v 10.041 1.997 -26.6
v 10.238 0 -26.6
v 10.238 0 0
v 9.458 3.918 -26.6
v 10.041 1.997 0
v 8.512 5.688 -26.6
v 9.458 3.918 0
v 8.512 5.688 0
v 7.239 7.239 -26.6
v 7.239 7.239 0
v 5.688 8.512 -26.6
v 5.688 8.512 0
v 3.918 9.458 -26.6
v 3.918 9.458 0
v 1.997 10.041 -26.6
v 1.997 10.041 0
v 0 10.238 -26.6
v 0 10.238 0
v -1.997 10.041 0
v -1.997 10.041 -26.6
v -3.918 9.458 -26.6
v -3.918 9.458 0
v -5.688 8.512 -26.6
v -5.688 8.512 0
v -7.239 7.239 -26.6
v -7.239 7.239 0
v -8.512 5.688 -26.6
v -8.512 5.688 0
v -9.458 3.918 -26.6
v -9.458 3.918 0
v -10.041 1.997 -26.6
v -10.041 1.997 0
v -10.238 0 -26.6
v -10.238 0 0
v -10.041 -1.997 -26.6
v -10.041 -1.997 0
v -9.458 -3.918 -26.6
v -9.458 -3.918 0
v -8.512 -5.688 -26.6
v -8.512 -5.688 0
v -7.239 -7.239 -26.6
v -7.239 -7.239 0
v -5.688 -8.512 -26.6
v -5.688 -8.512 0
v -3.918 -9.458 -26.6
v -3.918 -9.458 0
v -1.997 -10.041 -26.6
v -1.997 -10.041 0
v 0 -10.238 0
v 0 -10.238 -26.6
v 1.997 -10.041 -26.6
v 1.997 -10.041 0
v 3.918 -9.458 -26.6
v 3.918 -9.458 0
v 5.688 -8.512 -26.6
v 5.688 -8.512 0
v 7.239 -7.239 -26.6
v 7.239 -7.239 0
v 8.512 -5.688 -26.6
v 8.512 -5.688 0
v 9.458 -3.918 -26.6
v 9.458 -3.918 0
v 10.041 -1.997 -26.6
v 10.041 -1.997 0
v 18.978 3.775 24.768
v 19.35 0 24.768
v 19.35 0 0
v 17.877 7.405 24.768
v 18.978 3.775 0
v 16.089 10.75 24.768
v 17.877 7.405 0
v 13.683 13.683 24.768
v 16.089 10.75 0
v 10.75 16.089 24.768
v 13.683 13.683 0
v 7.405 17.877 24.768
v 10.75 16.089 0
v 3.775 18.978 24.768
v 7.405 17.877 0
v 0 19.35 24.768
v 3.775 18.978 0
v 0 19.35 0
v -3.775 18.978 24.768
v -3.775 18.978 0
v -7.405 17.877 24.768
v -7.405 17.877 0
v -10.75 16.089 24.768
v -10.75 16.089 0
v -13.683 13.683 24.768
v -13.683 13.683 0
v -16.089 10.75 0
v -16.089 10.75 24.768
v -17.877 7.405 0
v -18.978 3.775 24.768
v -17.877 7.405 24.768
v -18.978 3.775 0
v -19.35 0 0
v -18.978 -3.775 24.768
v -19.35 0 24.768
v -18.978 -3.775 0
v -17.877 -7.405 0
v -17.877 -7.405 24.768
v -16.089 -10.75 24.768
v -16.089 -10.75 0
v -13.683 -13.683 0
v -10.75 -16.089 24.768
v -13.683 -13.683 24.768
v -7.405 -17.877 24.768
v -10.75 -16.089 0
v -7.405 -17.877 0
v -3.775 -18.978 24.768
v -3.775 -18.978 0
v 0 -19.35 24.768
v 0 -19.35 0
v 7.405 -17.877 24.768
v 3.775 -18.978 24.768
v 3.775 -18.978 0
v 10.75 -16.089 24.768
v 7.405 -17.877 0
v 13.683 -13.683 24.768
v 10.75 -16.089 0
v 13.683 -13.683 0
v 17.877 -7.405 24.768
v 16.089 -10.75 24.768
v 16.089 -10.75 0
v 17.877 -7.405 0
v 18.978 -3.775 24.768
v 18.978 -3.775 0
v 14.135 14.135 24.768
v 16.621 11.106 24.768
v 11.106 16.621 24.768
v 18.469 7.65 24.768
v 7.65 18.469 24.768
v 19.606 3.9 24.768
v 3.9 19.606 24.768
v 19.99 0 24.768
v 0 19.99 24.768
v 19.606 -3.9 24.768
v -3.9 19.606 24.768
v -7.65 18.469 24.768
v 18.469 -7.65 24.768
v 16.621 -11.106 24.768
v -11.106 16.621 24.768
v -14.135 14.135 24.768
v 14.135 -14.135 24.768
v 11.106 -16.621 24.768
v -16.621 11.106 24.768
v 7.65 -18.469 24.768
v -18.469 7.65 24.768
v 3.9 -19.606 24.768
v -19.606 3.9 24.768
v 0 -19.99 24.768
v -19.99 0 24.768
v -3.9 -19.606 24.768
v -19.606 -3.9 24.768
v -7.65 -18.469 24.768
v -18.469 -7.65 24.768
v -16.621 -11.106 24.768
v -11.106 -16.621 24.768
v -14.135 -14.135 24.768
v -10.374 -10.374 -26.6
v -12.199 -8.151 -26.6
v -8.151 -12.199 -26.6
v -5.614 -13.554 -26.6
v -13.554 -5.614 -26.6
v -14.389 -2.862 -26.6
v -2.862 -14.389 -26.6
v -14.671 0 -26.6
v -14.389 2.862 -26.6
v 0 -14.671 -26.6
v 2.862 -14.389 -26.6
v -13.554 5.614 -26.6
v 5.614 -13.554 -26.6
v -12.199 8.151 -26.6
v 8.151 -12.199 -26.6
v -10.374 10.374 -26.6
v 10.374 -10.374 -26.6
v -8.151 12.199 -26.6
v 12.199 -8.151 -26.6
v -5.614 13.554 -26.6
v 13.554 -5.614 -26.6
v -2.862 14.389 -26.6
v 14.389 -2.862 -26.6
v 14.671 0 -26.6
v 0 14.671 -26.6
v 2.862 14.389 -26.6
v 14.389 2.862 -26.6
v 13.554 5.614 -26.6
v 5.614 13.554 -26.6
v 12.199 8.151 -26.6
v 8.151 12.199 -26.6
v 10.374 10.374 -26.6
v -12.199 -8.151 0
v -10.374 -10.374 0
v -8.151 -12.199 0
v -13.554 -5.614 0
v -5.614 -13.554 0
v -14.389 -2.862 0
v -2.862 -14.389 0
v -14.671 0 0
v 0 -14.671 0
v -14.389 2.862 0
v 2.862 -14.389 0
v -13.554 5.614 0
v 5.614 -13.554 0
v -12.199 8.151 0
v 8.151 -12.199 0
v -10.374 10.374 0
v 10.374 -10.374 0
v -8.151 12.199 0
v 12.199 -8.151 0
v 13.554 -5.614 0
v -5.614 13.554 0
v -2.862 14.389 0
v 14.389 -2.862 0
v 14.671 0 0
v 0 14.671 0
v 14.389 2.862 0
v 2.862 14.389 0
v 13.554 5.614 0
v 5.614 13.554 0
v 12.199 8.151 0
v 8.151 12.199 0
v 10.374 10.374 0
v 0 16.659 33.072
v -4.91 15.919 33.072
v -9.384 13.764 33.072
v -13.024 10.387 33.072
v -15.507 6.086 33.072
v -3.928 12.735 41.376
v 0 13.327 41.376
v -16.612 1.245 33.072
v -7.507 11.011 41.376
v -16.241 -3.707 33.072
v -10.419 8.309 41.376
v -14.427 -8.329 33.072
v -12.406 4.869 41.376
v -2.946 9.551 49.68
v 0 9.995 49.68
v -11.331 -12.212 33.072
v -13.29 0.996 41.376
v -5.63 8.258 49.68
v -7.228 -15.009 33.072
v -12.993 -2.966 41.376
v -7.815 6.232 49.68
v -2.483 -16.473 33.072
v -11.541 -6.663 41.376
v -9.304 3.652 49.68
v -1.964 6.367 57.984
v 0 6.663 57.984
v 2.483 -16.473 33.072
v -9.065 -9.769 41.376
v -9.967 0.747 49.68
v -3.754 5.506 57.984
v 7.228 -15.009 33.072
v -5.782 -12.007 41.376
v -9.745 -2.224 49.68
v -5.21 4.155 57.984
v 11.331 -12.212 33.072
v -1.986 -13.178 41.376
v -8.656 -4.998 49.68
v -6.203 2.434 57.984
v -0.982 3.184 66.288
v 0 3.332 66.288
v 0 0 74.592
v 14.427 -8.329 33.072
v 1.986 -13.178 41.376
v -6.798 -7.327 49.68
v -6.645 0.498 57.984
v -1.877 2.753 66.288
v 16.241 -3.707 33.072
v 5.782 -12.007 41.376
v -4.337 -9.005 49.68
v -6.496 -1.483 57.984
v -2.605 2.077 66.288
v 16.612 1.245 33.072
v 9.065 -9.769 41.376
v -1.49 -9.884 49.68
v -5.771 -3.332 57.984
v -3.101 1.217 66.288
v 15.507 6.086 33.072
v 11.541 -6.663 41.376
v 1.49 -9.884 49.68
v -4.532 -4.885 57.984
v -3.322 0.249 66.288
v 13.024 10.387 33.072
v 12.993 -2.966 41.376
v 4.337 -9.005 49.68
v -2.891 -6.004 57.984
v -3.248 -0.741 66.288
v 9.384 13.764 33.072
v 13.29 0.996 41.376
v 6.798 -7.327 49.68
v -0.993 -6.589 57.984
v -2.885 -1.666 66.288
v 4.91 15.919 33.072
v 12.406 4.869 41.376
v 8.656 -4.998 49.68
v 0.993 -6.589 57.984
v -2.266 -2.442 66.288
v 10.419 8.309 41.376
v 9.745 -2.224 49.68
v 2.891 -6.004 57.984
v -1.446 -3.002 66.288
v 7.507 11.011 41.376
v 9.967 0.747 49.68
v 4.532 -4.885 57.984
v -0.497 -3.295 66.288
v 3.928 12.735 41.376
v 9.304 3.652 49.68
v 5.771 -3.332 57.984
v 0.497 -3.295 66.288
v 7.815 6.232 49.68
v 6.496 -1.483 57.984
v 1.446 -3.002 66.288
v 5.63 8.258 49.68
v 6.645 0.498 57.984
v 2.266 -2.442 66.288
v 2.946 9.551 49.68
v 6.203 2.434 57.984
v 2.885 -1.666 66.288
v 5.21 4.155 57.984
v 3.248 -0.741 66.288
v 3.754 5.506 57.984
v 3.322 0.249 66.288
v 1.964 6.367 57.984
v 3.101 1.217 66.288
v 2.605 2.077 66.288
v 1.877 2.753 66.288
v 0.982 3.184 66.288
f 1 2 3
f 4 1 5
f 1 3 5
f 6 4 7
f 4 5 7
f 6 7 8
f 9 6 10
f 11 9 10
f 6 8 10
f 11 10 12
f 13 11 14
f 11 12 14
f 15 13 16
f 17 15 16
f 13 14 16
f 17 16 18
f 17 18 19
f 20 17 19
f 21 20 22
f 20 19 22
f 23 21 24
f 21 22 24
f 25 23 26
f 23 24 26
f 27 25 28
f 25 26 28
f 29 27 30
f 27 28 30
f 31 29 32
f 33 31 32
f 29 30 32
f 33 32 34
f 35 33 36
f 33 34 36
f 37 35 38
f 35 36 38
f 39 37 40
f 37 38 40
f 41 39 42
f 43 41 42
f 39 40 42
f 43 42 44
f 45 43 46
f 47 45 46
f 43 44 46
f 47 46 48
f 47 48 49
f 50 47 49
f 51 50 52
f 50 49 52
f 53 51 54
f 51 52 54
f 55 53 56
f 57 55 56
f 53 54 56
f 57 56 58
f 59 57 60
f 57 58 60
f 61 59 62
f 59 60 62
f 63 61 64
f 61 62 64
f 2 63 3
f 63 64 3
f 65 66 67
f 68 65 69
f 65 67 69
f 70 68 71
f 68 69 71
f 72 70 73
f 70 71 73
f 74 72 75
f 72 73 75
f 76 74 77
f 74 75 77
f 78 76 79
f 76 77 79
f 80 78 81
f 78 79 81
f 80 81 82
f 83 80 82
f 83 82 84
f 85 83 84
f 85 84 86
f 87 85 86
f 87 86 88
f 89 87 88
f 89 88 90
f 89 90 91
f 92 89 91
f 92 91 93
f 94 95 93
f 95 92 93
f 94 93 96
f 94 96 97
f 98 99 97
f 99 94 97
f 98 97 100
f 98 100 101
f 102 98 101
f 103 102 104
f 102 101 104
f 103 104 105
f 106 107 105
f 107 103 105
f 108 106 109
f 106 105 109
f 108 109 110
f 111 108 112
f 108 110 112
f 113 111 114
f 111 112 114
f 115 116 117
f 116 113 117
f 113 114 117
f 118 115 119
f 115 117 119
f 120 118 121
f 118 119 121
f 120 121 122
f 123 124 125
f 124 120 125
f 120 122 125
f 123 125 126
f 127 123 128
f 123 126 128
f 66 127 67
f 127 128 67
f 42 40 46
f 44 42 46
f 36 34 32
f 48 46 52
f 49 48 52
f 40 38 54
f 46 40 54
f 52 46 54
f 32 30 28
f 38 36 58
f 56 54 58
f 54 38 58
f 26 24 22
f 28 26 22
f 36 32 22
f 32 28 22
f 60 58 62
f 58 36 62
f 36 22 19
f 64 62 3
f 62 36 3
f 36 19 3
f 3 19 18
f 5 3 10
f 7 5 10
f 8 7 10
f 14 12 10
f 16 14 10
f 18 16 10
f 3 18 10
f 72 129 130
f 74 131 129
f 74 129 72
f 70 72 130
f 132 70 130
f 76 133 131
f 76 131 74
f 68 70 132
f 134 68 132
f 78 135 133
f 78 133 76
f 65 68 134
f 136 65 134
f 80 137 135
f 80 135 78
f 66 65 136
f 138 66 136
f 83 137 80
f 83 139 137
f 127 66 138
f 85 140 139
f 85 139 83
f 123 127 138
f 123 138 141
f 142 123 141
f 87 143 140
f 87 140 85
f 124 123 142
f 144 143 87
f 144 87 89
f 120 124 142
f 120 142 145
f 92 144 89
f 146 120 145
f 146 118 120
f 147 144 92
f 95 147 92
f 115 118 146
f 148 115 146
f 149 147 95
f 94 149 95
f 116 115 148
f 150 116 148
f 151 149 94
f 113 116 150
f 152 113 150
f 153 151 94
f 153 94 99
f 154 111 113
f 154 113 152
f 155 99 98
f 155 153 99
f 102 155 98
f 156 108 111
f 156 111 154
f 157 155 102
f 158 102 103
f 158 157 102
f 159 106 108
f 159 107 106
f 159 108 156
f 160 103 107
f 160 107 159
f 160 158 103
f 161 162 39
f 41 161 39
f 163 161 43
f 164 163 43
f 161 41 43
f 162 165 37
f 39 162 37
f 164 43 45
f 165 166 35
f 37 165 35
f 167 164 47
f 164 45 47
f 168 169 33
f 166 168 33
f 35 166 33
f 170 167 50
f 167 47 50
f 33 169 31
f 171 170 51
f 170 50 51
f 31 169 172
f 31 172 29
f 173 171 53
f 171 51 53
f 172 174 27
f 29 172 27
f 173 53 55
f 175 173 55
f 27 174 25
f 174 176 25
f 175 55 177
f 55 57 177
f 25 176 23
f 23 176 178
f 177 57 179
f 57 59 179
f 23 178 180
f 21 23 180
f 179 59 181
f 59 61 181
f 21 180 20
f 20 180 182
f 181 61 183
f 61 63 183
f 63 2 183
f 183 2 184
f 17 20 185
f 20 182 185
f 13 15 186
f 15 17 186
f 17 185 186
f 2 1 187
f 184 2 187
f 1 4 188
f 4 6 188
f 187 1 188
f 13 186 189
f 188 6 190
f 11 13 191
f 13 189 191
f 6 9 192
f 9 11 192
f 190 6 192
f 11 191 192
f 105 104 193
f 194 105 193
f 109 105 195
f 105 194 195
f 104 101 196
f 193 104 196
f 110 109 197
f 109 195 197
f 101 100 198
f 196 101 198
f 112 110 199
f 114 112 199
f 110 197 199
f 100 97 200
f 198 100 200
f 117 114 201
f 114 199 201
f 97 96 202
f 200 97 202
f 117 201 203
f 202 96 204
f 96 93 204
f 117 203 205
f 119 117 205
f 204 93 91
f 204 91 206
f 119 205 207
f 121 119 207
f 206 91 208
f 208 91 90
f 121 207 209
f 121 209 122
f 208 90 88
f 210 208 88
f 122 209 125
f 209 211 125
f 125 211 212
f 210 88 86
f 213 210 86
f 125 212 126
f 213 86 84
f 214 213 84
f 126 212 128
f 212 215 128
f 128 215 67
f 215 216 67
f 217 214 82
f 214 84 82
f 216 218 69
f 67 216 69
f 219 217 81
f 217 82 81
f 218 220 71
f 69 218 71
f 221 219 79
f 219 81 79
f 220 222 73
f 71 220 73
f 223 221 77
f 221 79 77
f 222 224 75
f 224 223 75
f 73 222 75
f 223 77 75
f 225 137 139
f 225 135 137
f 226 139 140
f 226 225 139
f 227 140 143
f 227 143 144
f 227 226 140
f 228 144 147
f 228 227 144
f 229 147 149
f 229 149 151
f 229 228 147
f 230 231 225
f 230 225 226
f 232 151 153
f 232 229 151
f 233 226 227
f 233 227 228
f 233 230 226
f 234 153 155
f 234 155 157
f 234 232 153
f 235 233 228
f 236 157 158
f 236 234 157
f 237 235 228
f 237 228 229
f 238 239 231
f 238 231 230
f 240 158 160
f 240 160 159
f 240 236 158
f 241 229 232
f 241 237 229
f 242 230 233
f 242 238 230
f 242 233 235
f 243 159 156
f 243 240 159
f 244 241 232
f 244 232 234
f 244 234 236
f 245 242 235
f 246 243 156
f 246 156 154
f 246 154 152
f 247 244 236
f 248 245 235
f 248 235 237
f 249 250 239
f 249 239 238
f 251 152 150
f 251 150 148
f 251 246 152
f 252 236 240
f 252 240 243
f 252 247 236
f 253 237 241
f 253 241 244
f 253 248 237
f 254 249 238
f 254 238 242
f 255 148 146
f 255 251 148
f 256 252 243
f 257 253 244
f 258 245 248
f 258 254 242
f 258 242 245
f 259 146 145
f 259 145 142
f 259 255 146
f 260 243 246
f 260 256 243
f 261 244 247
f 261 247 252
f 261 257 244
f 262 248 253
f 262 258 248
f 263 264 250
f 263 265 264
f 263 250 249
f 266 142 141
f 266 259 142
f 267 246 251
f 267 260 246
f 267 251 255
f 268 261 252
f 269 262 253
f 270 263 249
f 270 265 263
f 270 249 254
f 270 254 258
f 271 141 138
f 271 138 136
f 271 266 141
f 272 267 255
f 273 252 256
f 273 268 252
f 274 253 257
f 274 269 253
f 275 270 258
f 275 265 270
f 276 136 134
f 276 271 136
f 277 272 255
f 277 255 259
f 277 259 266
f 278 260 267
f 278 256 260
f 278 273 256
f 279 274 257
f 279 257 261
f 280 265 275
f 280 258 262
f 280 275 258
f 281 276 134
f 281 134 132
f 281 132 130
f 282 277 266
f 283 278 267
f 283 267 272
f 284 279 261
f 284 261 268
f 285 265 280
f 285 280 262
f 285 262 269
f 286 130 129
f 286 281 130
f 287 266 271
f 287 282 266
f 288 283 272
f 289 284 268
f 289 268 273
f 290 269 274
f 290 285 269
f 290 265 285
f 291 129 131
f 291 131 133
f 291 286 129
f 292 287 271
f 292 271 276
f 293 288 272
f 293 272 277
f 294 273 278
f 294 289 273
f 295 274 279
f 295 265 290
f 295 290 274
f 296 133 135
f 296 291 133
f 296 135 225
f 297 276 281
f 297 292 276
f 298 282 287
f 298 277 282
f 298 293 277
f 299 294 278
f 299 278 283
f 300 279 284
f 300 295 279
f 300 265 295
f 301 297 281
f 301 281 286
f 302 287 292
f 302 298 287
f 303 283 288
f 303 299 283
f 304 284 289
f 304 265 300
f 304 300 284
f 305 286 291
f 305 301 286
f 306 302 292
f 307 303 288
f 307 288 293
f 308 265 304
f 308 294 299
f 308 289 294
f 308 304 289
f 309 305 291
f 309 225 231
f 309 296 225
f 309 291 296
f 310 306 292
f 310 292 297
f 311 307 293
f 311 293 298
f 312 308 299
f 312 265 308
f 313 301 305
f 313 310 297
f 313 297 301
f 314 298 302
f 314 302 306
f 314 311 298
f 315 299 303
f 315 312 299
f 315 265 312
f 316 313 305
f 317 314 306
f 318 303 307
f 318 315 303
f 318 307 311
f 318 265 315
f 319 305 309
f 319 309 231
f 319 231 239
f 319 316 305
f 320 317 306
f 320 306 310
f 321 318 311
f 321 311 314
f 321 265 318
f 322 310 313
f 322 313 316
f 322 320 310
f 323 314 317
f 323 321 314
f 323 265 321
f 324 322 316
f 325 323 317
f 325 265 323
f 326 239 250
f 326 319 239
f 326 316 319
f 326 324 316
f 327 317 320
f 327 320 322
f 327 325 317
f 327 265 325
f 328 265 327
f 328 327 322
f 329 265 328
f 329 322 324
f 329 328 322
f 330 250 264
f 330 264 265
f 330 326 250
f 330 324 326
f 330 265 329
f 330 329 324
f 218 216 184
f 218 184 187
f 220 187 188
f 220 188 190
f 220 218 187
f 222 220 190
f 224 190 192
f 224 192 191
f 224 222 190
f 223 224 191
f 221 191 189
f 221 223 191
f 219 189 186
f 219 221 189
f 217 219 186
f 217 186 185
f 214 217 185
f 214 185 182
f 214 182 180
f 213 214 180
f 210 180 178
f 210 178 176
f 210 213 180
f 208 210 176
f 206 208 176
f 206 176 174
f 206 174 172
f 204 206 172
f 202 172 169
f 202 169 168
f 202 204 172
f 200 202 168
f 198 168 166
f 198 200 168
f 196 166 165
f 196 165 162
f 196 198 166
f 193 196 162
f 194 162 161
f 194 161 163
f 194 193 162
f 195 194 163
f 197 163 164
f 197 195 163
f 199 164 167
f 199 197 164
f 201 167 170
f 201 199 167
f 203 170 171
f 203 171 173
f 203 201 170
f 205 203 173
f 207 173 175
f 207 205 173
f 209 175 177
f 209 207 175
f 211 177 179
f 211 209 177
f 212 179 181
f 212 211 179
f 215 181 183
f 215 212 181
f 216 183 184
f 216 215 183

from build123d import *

# Parameters (mm, degrees)
F0_R     = 19.35
F1_DEPTH = 25
F4_R     = 14.671032
F4_R_2   = 10.237718
F5_DEPTH = 26.6


with BuildPart() as f1:
    # F0 (on Top) → F1 (new body)
    with BuildSketch(Plane.XY):
        Circle(F0_R)
    extrude(amount=F1_DEPTH)

    # F2 (on Right) → F3 (revolve)
    with BuildSketch(Plane.YZ):
        Polygon((0, 24.767736), (19.990396, 24.767736), (0, 74.592263), align=None)
    revolve(axis=Axis((0, 0, 4.910189), (0, 0, 1)))

    # F4 (on Top) → F5 (join)
    with BuildSketch(Plane.XY):
        Circle(F4_R)
        Circle(F4_R_2, mode=Mode.SUBTRACT)
    extrude(amount=-F5_DEPTH)


solid = f1.part
